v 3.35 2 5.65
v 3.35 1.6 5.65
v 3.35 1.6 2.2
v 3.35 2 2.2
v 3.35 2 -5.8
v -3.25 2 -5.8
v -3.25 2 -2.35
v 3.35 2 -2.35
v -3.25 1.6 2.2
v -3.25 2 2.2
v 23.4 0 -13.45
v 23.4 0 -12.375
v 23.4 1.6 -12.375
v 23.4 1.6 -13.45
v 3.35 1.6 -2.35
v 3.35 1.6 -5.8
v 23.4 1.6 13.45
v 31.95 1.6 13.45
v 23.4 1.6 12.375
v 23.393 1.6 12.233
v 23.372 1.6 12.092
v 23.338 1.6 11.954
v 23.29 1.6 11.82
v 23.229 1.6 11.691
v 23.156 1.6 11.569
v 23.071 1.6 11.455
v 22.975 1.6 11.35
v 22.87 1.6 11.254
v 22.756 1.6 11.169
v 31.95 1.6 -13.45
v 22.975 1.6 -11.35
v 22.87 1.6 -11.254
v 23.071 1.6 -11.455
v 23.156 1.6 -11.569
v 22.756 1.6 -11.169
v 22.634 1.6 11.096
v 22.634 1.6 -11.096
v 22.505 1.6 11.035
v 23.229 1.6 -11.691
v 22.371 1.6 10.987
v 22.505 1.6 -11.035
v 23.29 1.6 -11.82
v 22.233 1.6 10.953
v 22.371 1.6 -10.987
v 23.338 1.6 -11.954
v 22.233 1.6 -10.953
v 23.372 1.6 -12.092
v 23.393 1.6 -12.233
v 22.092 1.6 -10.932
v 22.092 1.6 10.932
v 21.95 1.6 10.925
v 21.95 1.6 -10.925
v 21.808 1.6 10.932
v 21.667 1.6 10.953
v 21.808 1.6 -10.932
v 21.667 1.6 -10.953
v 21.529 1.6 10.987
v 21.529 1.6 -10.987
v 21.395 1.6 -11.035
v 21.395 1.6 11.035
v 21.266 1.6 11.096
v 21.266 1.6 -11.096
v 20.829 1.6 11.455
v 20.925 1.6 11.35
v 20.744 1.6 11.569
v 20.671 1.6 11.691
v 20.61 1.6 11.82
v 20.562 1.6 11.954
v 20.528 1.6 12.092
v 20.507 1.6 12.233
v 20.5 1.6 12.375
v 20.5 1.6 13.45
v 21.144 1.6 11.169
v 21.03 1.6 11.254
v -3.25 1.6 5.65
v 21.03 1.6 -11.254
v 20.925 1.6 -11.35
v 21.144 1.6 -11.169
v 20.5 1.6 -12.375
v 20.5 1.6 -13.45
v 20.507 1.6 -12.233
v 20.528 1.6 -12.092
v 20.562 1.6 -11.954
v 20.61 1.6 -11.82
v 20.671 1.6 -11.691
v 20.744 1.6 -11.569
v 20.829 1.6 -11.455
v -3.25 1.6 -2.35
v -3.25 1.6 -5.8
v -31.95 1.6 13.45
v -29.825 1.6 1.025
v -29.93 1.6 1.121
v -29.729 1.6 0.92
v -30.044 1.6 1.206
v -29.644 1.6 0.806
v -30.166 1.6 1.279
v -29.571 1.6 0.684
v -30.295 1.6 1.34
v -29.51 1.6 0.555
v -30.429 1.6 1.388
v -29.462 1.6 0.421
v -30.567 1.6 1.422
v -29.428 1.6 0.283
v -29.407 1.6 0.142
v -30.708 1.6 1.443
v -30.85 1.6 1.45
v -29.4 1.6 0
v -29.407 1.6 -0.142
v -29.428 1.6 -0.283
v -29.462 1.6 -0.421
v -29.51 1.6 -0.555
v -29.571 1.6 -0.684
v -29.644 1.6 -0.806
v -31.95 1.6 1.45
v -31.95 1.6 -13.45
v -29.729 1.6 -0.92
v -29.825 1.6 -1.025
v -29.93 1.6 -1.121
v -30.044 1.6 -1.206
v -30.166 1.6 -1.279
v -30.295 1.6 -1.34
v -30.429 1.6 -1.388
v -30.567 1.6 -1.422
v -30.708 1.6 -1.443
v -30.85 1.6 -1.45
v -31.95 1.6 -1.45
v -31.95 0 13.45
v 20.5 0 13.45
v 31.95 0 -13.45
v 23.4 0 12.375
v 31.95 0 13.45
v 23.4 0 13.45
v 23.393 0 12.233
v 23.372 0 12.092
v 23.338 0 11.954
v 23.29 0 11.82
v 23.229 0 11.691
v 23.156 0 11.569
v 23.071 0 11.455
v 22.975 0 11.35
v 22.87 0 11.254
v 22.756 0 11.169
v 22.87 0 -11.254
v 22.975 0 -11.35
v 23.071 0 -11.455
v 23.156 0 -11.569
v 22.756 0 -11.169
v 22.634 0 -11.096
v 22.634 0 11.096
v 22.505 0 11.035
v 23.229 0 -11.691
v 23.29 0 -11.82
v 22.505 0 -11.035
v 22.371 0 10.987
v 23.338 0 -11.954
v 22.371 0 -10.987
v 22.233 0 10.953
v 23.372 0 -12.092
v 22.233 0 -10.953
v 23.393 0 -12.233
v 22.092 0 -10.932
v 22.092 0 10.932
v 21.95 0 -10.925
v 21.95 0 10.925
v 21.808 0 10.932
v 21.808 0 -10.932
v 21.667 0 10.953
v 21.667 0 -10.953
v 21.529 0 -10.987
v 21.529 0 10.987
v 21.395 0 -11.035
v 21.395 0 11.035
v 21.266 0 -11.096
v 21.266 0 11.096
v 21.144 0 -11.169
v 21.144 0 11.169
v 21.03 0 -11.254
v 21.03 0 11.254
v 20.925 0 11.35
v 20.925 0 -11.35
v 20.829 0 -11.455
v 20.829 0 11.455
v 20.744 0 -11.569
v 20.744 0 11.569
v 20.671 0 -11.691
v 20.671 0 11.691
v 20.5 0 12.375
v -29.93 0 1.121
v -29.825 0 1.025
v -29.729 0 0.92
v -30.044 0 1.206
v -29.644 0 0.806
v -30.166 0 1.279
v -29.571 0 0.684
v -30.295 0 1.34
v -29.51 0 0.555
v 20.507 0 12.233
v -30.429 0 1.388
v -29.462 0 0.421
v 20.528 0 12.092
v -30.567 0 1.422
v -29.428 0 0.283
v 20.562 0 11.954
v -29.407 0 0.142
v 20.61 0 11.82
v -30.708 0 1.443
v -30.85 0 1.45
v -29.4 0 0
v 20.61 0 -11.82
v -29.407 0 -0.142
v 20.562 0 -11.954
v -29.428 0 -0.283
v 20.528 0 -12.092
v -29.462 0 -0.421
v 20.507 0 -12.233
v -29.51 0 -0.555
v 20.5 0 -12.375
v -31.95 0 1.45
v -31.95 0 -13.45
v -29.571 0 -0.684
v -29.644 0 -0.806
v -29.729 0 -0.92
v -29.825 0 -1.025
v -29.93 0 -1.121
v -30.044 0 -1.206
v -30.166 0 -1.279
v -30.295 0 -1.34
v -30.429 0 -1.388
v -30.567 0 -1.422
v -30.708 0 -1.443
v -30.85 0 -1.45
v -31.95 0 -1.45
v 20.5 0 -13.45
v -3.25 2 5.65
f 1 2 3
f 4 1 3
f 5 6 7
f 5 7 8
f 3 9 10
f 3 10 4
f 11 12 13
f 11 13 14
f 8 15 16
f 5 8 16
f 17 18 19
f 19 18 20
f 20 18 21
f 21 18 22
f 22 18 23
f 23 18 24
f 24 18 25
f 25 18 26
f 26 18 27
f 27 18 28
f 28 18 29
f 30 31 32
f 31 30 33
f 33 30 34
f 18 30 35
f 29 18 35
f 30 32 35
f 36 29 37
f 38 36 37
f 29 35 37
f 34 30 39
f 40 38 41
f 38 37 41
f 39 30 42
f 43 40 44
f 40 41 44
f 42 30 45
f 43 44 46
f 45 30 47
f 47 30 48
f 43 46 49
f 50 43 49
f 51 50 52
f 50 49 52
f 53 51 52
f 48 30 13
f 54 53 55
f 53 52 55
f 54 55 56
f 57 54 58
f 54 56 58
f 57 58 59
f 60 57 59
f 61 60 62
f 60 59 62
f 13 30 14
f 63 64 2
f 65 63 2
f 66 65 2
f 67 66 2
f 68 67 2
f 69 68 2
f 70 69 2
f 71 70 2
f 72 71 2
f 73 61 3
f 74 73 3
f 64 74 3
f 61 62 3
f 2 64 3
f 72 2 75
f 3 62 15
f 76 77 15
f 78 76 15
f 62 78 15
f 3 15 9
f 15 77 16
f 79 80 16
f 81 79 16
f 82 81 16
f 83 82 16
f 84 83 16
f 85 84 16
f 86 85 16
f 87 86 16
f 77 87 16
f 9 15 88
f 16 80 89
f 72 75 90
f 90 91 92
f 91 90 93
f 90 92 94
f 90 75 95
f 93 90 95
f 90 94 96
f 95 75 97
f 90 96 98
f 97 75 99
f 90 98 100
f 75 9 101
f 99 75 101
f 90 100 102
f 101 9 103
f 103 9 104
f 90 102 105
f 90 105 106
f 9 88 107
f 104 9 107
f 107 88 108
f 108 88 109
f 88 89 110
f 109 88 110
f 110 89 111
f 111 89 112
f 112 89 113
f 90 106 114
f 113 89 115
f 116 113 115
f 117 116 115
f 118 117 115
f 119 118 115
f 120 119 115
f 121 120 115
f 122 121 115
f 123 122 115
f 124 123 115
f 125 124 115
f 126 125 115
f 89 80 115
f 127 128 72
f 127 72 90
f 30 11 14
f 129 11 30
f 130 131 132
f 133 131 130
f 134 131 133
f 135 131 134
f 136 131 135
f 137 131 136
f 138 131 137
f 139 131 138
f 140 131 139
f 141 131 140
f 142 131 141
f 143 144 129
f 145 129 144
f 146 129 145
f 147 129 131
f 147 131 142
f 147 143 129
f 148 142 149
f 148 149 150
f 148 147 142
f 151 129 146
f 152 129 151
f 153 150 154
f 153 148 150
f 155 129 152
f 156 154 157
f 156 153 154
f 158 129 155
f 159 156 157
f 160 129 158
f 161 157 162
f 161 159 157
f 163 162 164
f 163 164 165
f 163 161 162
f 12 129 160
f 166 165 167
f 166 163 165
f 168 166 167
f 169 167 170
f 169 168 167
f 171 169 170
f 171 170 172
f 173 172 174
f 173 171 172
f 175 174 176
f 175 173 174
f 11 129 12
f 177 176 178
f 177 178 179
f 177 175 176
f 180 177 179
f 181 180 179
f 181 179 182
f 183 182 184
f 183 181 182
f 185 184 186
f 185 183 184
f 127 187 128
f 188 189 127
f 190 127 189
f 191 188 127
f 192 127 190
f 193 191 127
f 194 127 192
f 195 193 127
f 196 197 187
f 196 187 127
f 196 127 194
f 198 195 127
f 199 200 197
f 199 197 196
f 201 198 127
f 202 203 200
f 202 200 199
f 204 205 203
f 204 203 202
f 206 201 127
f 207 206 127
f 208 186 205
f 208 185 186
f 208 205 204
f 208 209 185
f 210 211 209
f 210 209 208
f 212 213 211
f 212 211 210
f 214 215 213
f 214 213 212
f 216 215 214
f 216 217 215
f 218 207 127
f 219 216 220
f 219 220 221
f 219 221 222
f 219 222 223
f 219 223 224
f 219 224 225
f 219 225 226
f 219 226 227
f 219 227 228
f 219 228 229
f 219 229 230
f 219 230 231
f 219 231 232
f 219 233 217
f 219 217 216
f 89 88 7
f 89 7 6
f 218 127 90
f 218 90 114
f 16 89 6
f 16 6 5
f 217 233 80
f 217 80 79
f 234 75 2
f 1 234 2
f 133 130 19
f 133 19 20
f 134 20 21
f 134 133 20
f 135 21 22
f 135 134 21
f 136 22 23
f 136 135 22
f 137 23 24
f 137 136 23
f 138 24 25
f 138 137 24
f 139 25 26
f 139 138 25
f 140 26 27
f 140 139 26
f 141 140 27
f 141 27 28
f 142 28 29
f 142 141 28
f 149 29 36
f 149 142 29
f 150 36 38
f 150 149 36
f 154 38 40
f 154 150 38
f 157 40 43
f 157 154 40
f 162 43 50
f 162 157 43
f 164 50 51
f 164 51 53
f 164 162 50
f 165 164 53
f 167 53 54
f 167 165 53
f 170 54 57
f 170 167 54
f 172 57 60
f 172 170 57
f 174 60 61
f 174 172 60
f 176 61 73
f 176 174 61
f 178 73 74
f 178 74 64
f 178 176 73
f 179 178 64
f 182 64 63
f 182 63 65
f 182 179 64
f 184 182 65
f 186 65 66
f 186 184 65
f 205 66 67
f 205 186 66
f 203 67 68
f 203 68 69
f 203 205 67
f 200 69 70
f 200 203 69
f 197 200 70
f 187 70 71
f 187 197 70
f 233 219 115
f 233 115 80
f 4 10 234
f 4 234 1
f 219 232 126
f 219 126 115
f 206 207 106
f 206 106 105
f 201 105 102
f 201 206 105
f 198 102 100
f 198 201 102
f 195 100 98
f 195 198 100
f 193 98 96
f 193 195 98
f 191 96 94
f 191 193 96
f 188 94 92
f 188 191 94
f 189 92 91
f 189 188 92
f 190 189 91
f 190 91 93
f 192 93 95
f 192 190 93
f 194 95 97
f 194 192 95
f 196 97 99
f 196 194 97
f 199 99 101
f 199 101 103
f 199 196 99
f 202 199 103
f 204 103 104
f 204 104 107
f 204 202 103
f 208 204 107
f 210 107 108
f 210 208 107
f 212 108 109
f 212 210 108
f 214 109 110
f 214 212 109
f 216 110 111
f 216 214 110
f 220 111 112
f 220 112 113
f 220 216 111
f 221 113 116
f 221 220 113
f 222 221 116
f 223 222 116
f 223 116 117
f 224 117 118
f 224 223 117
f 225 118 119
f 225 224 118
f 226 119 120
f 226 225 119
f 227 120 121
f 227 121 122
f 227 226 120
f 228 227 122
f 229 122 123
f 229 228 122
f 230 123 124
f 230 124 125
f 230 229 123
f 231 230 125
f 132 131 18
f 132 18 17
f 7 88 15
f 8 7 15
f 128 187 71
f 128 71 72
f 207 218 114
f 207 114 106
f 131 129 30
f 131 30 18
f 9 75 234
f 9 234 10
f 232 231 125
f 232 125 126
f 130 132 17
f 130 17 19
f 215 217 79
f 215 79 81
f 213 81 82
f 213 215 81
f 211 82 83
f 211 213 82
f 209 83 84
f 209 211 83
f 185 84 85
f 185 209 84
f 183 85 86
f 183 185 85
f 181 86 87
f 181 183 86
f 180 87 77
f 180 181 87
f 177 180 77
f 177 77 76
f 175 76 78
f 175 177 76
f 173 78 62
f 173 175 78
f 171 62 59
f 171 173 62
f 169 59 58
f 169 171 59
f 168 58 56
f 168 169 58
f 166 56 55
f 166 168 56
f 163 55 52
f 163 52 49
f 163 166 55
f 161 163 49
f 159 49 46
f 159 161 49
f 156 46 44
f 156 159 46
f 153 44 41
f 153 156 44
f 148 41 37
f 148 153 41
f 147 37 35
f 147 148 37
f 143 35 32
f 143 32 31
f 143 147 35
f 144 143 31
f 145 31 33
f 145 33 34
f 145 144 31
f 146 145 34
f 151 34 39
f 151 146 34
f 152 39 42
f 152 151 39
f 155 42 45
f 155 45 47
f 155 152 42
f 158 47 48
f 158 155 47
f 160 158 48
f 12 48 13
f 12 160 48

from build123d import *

# Parameters (mm, degrees)
BOSS_EXTRUDE1_DEPTH = 1.6
SKETCH2_W           = 6.6
SKETCH2_H           = 3.45
BOSS_EXTRUDE2_DEPTH = 0.4


with BuildPart() as part:
    # Sketch1 → Boss-Extrude1 (new body)
    with BuildSketch(Plane(origin=(0, 0, 0), x_dir=(1, 0, 0), z_dir=(0, 1, 0))):
        with BuildLine():
            Line((31.95, -13.45), (23.4, -13.45))
            Line((23.4, -13.45), (23.4, -12.375))
            ThreePointArc((23.4, -12.375), (21.95, -10.925), (20.5, -12.375))
            Line((20.5, -12.375), (20.5, -13.45))
            Line((20.5, -13.45), (-31.95, -13.45))
            Line((-31.95, -13.45), (-31.95, -1.45))
            Line((-31.95, -1.45), (-30.85, -1.45))
            ThreePointArc((-30.85, -1.45), (-29.4, 0), (-30.85, 1.45))
            Line((-30.85, 1.45), (-31.95, 1.45))
            Line((-31.95, 1.45), (-31.95, 13.45))
            Line((-31.95, 13.45), (20.5, 13.45))
            Line((20.5, 13.45), (20.5, 12.375))
            ThreePointArc((20.5, 12.375), (21.95, 10.925), (23.4, 12.375))
            Line((23.4, 12.375), (23.4, 13.45))
            Line((23.4, 13.45), (31.95, 13.45))
            Line((31.95, 13.45), (31.95, -13.45))
        make_face()
    extrude(amount=BOSS_EXTRUDE1_DEPTH)

    # Sketch2 → Boss-Extrude2 (add)
    with BuildSketch(Plane(origin=(0, 1.6, 0), x_dir=(1, 0, 0), z_dir=(0, 1, 0))):
        with Locations((0.05, 4.075)):
            Rectangle(SKETCH2_W, SKETCH2_H)
        with Locations((0.05, -3.925)):
            Rectangle(SKETCH2_W, SKETCH2_H)
    extrude(amount=BOSS_EXTRUDE2_DEPTH)


solid = part.part
